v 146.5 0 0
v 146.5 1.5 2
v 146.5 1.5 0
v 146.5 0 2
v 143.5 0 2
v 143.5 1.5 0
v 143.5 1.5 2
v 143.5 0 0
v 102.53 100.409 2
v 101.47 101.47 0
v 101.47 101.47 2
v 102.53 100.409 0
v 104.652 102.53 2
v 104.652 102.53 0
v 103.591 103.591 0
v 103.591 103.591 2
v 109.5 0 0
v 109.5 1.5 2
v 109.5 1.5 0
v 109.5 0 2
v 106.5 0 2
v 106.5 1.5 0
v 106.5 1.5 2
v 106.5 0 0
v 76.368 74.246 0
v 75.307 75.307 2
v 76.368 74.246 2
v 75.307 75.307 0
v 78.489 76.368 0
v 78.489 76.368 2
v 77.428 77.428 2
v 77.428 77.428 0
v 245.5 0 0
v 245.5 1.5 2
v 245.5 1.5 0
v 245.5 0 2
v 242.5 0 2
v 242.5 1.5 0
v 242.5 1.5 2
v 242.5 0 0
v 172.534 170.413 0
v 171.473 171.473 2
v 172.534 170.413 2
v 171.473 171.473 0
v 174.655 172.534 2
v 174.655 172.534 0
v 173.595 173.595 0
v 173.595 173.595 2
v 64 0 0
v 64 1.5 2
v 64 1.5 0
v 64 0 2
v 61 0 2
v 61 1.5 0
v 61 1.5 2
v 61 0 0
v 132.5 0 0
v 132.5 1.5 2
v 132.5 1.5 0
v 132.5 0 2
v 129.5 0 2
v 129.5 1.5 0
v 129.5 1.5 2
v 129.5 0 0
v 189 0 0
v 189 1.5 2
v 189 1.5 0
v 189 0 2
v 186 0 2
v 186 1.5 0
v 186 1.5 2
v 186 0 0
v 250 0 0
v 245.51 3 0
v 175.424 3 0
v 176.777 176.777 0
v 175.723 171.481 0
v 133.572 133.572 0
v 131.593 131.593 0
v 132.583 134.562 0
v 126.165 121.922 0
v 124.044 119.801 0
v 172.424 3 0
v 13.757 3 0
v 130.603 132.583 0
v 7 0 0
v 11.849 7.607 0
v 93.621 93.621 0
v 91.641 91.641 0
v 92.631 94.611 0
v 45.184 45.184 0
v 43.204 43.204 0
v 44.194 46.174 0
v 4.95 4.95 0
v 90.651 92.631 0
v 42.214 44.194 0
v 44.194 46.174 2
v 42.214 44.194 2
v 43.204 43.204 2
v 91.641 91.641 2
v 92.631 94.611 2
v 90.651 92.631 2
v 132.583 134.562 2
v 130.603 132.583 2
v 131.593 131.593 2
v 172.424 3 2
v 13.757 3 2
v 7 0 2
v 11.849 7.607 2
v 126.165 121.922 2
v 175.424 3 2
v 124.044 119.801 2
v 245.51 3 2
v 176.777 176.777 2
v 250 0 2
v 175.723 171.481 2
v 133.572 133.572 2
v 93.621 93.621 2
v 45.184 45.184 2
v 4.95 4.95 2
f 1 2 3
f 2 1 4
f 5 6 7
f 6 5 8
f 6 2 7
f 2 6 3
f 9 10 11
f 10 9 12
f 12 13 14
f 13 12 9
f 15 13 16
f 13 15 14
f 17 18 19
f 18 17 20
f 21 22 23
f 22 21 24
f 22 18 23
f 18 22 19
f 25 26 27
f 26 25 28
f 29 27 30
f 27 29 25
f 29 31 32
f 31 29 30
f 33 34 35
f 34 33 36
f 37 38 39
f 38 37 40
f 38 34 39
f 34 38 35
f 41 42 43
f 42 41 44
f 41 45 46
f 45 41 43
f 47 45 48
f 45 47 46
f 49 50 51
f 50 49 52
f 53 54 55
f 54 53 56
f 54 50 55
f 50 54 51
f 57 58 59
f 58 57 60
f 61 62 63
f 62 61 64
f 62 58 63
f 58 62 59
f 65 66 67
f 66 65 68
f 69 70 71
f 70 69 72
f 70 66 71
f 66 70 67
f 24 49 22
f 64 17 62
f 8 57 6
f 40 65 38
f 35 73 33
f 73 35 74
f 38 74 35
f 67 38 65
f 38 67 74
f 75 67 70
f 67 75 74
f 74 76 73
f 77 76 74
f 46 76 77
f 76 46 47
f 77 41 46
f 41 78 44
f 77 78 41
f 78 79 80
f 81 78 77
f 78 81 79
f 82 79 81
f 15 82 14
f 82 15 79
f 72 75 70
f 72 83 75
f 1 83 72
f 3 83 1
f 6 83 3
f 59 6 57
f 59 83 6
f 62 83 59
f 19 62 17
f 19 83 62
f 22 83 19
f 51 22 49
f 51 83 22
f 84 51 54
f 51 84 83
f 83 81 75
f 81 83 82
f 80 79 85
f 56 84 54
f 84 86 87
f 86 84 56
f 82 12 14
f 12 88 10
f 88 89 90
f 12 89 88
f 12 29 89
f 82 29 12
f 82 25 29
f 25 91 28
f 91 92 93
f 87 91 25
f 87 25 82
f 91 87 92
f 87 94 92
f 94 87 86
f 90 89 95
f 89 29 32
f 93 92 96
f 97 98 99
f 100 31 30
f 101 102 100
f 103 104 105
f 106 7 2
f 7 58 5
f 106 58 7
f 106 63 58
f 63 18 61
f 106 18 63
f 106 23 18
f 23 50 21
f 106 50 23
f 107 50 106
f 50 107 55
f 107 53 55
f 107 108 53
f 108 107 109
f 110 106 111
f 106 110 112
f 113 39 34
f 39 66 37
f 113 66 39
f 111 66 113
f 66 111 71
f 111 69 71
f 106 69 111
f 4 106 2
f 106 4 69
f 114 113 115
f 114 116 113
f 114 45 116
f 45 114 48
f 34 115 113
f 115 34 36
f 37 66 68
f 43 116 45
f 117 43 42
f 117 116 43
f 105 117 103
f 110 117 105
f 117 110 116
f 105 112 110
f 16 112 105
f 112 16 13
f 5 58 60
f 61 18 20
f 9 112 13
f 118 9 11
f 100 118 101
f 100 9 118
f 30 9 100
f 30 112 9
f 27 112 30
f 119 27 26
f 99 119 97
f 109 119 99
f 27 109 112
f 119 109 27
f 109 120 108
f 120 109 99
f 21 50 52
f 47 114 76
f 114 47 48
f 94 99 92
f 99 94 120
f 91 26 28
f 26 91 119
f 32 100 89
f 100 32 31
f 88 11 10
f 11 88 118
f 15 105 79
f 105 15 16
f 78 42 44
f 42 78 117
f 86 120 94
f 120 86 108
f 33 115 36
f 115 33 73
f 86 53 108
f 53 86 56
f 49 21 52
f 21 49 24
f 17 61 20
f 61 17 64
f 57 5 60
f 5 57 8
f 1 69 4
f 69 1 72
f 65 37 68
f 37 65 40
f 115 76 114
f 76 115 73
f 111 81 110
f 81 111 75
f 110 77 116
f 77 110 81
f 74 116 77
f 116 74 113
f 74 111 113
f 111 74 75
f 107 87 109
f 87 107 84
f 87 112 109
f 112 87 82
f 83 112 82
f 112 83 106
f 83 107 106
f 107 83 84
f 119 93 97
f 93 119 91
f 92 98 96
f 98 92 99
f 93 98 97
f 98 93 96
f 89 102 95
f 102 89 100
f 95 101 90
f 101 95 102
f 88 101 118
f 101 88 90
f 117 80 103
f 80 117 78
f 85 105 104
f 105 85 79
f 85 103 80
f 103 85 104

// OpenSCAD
function crossX(p1,p2,p3,p4) = ((p1[0]*p2[1]-p1[1]*p2[0])*(p3[0]-p4[0])-(p1[0]-p2[0])*(p3[0]*p4[1]-p3[1]*p4[0])) / ((p1[0]-p2[0])*(p3[1]-p4[1])-(p1[1]-p2[1])*(p3[0]-p4[0]) ) ;

function crossY(p1,p2,p3,p4) = ((p1[0]*p2[1]-p1[1]*p2[0])*(p3[1]-p4[1])-(p1[1]-p2[1])*(p3[0]*p4[1]-p3[1]*p4[0])) / ((p1[0]-p2[0])*(p3[1]-p4[1])-(p1[1]-p2[1])*(p3[0]-p4[0]) ) ;

module section(w = 250, h=2, sup=80, gap=0.2, th=3){
	
	ir = 7;
	
	ith = 8;
	
	beam_delta = 2*w/3;

	p1 = [ir,0];
	p2 = [w,0];
	p3 = [w*cos(45),w*sin(45)];
	p4 = [ir*cos(45),ir*sin(45)];

	ta1 = [ p1[0], p1[1] ] + [0, th];
	ta2 = [ p2[0], p2[1] ] + [0, th];

	tb1 = [ p2[0], p2[1] ] + [-cos(22.5)*th,-sin(22.5)*th];
	tb2 = [ p3[0], p3[1] ] + [-cos(22.5)*th,-sin(22.5)*th];

	tc1 = [ p3[0], p3[1] ] + [cos(45)*th,-sin(45)*th];
	tc2 = [ p4[0], p4[1] ] + [cos(45)*th,-sin(45)*th];

	td1 = [ p4[0], p4[1] ] + [cos(45)*(beam_delta+th),sin(45)*(beam_delta+th)];
	td2 = [ p1[0], p1[1] ] + [cos(45)*(beam_delta+th),sin(45)*(beam_delta+th)];

	te1 = [ p4[0], p4[1] ] + [cos(45)*(beam_delta),sin(45)*(beam_delta)];
	te2 = [ p1[0], p1[1] ] + [cos(45)*(beam_delta),sin(45)*(beam_delta)];

	tf1 = [ p4[0], p4[1] ] + [cos(45)*(ith),sin(45)*(ith)];
	tf2 = [ p1[0], p1[1] ] + [cos(45)*(ith),sin(45)*(ith)];

	t1 = [ crossX(td1,td2,ta1,ta2), crossY(td1,td2,ta1,ta2)];
	t2 = [ crossX(ta1,ta2,tb1,tb2), crossY(ta1,ta2,tb1,tb2)];
	t3 = [ crossX(tb1,tb2,tc1,tc2), crossY(tb1,tb2,tc1,tc2)];
	t4 = [ crossX(tc1,tc2,td1,td2), crossY(tc1,tc2,td1,td2)];

	k1 = [ crossX(te1,te2,ta1,ta2), crossY(te1,te2,ta1,ta2)];
	k2 = [ crossX(te1,te2,tc1,tc2), crossY(te1,te2,tc1,tc2)];
	k3 = [ crossX(tf1,tf2,tc1,tc2), crossY(tf1,tf2,tc1,tc2)];
	k4 = [ crossX(tf1,tf2,ta1,ta2), crossY(tf1,tf2,ta1,ta2)];

	outer  = [p1,p2,p3,p4];
	outerN = [0,1,2,3];

	inner = [t1,t2,t3,t4];
	innerN = [4,5,6,7];

	near = [k1,k2,k3,k4];
	nearN = [8,9,10,11];
	
	link_dist = [w/4,2*w/4+th*2,3*w/4];


	all = concat(outer,inner,near);

    render(){
	    difference(){
		    linear_extrude(h){
				polygon(
					all,
				    [outerN,innerN,nearN]
				);
			}
		
		    for(delta=[w/2+sup/4,w/2+sup/4-sup/2+th,w-th*2]){
				translate([delta,0,0]){
					cube([th,th,10*th],center=true);
				}
				rotate(a=45,v=[0,0,1]){
					translate([delta,0,0]){
						cube([th,th,10*th],center=true);
					}
				}
			}
			
		    for(delta=link_dist){
				translate([delta,0,0]){
					cube([th,th,10*th],center=true);
				}
			}
		}
		
	    for(delta=link_dist){
			rotate(a=45,v=[0,0,1]){
				translate([delta,0,h/2]){
					cube([th-gap,th-gap,h],center=true);
				}
			}
		}
		
	    
	
		
	}
    
    
	

	//echo( cross([0,0],[1,1));
}


section();
